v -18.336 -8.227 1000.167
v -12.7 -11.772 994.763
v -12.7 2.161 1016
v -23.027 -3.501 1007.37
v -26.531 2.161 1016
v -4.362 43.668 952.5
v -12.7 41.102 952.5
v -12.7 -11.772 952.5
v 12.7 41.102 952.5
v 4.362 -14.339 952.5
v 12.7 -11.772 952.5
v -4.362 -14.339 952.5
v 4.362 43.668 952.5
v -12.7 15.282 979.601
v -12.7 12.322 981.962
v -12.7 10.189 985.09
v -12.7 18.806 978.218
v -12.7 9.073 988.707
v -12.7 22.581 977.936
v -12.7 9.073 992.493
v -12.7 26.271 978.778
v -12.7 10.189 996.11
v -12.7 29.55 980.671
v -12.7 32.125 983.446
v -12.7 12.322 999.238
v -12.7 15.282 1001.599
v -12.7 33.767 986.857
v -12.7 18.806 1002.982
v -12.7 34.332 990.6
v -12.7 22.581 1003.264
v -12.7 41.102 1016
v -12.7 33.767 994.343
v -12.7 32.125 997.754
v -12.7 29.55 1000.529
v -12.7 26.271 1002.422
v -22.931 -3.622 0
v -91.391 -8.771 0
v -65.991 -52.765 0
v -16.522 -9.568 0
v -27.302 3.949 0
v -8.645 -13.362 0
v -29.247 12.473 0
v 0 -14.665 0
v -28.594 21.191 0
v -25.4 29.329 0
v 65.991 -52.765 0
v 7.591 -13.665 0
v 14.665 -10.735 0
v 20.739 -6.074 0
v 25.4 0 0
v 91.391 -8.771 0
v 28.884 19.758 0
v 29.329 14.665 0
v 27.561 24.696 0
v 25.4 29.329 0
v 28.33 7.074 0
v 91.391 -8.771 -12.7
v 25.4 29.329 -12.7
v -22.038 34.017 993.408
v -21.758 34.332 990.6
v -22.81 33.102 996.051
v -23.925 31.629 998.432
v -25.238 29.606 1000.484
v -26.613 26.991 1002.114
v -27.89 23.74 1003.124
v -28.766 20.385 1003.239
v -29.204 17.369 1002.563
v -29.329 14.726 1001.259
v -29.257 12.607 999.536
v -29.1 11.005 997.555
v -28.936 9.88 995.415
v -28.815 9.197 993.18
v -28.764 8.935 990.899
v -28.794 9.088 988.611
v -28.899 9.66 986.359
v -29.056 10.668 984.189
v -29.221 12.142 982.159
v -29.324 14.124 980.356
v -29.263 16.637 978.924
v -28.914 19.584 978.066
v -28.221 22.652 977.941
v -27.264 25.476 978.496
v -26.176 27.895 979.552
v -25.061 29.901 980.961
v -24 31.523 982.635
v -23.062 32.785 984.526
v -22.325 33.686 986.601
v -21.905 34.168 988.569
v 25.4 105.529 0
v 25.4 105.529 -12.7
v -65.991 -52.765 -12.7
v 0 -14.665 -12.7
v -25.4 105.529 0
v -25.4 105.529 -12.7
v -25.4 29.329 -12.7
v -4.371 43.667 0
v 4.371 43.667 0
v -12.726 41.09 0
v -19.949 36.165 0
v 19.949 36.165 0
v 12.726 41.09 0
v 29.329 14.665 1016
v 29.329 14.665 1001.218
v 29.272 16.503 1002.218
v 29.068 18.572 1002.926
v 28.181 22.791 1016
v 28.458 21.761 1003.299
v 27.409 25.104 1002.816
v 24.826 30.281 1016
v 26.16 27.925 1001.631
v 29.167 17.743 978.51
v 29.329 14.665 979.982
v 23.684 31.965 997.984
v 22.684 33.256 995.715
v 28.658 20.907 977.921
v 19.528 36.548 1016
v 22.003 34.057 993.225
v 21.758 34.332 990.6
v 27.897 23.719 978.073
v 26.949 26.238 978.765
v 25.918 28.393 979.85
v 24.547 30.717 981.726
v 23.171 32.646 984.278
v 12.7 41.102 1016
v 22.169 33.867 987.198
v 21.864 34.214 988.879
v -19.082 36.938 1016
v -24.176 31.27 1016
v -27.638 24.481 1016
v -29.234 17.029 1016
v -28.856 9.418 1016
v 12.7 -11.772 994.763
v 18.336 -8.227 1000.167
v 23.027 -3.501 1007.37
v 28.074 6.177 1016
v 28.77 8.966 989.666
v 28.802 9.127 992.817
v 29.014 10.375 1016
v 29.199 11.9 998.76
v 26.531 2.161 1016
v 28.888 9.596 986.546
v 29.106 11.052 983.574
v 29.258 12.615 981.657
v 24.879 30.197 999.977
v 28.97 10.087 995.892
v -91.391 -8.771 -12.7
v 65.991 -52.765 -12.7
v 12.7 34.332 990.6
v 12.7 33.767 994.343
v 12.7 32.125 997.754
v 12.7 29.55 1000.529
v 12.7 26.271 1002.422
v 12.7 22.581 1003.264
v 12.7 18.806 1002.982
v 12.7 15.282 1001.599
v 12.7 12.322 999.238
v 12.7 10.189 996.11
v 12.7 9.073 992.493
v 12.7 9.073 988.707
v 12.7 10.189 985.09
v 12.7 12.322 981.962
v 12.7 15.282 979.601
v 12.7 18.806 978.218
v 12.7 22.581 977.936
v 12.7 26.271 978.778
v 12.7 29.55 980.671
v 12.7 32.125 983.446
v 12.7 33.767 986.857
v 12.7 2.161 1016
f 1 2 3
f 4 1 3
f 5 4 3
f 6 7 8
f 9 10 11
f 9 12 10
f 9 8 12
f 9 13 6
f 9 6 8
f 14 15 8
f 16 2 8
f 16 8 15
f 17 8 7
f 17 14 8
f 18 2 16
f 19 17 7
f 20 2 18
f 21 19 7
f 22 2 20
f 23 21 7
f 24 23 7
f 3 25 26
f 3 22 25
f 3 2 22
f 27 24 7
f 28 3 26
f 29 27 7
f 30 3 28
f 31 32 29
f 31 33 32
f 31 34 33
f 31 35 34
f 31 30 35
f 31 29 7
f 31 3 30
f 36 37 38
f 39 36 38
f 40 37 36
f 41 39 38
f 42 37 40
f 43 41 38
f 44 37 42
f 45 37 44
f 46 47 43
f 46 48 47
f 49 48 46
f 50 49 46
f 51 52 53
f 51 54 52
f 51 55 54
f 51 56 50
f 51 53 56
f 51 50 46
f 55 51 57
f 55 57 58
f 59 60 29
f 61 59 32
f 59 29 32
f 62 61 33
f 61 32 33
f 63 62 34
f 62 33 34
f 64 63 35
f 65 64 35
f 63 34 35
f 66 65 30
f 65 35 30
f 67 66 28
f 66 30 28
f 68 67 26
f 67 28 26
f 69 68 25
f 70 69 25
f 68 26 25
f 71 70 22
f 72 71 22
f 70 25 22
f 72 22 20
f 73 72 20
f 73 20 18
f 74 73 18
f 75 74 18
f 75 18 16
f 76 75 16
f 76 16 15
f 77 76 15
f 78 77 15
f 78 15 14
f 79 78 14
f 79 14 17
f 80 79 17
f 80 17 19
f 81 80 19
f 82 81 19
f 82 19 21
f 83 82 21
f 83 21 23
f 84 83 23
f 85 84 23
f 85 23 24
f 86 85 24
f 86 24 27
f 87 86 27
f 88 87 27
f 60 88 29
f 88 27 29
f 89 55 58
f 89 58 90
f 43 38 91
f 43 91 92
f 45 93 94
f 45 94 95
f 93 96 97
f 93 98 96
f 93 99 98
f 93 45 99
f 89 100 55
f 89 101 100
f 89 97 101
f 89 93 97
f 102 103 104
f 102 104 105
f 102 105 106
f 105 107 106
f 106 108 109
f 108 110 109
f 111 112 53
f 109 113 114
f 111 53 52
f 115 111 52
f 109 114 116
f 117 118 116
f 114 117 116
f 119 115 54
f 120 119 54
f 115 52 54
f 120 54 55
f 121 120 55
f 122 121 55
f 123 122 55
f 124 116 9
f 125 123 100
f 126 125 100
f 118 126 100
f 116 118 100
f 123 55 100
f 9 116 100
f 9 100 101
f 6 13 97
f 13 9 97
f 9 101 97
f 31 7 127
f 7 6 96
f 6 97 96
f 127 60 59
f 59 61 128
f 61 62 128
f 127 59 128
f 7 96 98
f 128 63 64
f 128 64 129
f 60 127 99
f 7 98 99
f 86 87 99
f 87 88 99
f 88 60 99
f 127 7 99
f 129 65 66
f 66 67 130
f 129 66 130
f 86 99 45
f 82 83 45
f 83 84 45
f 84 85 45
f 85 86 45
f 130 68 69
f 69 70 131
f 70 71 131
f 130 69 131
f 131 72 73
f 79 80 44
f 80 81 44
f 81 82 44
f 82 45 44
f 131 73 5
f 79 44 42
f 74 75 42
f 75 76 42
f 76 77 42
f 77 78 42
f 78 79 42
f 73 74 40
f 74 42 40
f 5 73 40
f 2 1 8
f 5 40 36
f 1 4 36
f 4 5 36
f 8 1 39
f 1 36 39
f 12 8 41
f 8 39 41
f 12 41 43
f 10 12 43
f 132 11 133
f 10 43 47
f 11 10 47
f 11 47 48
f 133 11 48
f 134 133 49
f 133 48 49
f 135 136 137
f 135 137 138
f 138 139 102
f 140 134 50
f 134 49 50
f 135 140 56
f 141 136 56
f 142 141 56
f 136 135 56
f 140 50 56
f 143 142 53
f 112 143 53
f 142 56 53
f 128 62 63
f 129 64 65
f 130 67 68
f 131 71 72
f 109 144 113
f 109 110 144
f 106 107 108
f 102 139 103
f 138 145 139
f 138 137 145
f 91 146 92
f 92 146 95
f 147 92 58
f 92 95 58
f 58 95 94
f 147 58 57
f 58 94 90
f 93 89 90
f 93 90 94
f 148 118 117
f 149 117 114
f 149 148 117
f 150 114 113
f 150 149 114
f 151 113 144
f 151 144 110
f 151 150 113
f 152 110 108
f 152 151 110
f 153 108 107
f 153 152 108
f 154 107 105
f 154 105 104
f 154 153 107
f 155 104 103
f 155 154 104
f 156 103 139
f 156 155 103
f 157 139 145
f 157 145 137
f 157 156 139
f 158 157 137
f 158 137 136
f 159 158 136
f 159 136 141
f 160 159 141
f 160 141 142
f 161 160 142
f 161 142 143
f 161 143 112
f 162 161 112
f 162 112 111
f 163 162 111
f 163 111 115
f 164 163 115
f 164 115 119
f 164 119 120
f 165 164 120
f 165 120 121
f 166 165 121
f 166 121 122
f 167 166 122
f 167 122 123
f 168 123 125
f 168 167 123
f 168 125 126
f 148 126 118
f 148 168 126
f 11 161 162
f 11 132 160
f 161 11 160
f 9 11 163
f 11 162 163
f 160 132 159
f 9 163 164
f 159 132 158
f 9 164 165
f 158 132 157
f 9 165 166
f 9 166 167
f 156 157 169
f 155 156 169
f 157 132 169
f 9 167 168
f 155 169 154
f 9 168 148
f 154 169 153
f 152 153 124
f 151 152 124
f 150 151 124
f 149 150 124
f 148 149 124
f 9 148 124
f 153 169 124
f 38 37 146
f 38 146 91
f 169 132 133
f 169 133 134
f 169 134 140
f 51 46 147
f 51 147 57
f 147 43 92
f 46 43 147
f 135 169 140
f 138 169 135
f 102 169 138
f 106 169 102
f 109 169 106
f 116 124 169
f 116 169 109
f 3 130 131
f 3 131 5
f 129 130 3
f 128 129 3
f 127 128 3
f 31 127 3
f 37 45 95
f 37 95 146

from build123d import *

# Parameters (mm, degrees)
F1_DEPTH      = 12.7
F2_R          = 29.3293936748
F3_DEPTH      = 1016
F4_W          = 25.4
F4_H          = 63.5
F5_DEPTH      = 63.5
F7_DEPTH      = 25.4
F7_DEPTH_BACK = 127
F8_R          = 12.7
F9_DEPTH      = 25.4
F9_DEPTH_BACK = 127


with BuildPart() as f1:
    # F0 (on Top) → F1 (new body)
    with BuildSketch(Plane.XY):
        Polygon((-25.4, 105.5293925285), (-25.4, 29.3293925285), (-91.3911340489, -8.7706104496), (-65.9911320635, -52.7646998156), (1.9854e-06, -14.6646968374), (65.9911394732, -52.7646938593), (91.3911374878, -8.7706022007), (25.4, 29.3293948211), (25.4, 105.5293925285), align=None)
    extrude(amount=-F1_DEPTH)

    # F2 (on face) → F3 (join)
    with BuildSketch(Plane.XY):
        with Locations((6.618e-07, 14.6646968374)):
            Circle(F2_R)
    extrude(amount=F3_DEPTH)

    # F4 (on face) → F5 (cut)
    with BuildSketch(Plane.XY.offset(1016)):
        with Locations((6.618e-07, 14.6646968374)):
            Rectangle(F4_W, F4_H)
    extrude(amount=-F5_DEPTH, mode=Mode.SUBTRACT)

    # F6 (on face) → F7 (cut, two sides)
    with BuildSketch(Plane.YZ.offset(-12.6999993382)) as f7_sk:
        Polygon((2.1613299569, 1016), (-11.7724613558, 1016), (-11.7724613558, 994.7630167007), align=None)
    extrude(amount=-F7_DEPTH, mode=Mode.SUBTRACT)
    extrude(f7_sk.sketch, amount=F7_DEPTH_BACK, mode=Mode.SUBTRACT)

    # F8 (on face) → F9 (cut, two sides)
    with BuildSketch(Plane.YZ.offset(-12.6999993382)) as f9_sk:
        with Locations((21.6315924938, 990.6)):
            Circle(F8_R)
    extrude(amount=-F9_DEPTH, mode=Mode.SUBTRACT)
    extrude(f9_sk.sketch, amount=F9_DEPTH_BACK, mode=Mode.SUBTRACT)


solid = f1.part
